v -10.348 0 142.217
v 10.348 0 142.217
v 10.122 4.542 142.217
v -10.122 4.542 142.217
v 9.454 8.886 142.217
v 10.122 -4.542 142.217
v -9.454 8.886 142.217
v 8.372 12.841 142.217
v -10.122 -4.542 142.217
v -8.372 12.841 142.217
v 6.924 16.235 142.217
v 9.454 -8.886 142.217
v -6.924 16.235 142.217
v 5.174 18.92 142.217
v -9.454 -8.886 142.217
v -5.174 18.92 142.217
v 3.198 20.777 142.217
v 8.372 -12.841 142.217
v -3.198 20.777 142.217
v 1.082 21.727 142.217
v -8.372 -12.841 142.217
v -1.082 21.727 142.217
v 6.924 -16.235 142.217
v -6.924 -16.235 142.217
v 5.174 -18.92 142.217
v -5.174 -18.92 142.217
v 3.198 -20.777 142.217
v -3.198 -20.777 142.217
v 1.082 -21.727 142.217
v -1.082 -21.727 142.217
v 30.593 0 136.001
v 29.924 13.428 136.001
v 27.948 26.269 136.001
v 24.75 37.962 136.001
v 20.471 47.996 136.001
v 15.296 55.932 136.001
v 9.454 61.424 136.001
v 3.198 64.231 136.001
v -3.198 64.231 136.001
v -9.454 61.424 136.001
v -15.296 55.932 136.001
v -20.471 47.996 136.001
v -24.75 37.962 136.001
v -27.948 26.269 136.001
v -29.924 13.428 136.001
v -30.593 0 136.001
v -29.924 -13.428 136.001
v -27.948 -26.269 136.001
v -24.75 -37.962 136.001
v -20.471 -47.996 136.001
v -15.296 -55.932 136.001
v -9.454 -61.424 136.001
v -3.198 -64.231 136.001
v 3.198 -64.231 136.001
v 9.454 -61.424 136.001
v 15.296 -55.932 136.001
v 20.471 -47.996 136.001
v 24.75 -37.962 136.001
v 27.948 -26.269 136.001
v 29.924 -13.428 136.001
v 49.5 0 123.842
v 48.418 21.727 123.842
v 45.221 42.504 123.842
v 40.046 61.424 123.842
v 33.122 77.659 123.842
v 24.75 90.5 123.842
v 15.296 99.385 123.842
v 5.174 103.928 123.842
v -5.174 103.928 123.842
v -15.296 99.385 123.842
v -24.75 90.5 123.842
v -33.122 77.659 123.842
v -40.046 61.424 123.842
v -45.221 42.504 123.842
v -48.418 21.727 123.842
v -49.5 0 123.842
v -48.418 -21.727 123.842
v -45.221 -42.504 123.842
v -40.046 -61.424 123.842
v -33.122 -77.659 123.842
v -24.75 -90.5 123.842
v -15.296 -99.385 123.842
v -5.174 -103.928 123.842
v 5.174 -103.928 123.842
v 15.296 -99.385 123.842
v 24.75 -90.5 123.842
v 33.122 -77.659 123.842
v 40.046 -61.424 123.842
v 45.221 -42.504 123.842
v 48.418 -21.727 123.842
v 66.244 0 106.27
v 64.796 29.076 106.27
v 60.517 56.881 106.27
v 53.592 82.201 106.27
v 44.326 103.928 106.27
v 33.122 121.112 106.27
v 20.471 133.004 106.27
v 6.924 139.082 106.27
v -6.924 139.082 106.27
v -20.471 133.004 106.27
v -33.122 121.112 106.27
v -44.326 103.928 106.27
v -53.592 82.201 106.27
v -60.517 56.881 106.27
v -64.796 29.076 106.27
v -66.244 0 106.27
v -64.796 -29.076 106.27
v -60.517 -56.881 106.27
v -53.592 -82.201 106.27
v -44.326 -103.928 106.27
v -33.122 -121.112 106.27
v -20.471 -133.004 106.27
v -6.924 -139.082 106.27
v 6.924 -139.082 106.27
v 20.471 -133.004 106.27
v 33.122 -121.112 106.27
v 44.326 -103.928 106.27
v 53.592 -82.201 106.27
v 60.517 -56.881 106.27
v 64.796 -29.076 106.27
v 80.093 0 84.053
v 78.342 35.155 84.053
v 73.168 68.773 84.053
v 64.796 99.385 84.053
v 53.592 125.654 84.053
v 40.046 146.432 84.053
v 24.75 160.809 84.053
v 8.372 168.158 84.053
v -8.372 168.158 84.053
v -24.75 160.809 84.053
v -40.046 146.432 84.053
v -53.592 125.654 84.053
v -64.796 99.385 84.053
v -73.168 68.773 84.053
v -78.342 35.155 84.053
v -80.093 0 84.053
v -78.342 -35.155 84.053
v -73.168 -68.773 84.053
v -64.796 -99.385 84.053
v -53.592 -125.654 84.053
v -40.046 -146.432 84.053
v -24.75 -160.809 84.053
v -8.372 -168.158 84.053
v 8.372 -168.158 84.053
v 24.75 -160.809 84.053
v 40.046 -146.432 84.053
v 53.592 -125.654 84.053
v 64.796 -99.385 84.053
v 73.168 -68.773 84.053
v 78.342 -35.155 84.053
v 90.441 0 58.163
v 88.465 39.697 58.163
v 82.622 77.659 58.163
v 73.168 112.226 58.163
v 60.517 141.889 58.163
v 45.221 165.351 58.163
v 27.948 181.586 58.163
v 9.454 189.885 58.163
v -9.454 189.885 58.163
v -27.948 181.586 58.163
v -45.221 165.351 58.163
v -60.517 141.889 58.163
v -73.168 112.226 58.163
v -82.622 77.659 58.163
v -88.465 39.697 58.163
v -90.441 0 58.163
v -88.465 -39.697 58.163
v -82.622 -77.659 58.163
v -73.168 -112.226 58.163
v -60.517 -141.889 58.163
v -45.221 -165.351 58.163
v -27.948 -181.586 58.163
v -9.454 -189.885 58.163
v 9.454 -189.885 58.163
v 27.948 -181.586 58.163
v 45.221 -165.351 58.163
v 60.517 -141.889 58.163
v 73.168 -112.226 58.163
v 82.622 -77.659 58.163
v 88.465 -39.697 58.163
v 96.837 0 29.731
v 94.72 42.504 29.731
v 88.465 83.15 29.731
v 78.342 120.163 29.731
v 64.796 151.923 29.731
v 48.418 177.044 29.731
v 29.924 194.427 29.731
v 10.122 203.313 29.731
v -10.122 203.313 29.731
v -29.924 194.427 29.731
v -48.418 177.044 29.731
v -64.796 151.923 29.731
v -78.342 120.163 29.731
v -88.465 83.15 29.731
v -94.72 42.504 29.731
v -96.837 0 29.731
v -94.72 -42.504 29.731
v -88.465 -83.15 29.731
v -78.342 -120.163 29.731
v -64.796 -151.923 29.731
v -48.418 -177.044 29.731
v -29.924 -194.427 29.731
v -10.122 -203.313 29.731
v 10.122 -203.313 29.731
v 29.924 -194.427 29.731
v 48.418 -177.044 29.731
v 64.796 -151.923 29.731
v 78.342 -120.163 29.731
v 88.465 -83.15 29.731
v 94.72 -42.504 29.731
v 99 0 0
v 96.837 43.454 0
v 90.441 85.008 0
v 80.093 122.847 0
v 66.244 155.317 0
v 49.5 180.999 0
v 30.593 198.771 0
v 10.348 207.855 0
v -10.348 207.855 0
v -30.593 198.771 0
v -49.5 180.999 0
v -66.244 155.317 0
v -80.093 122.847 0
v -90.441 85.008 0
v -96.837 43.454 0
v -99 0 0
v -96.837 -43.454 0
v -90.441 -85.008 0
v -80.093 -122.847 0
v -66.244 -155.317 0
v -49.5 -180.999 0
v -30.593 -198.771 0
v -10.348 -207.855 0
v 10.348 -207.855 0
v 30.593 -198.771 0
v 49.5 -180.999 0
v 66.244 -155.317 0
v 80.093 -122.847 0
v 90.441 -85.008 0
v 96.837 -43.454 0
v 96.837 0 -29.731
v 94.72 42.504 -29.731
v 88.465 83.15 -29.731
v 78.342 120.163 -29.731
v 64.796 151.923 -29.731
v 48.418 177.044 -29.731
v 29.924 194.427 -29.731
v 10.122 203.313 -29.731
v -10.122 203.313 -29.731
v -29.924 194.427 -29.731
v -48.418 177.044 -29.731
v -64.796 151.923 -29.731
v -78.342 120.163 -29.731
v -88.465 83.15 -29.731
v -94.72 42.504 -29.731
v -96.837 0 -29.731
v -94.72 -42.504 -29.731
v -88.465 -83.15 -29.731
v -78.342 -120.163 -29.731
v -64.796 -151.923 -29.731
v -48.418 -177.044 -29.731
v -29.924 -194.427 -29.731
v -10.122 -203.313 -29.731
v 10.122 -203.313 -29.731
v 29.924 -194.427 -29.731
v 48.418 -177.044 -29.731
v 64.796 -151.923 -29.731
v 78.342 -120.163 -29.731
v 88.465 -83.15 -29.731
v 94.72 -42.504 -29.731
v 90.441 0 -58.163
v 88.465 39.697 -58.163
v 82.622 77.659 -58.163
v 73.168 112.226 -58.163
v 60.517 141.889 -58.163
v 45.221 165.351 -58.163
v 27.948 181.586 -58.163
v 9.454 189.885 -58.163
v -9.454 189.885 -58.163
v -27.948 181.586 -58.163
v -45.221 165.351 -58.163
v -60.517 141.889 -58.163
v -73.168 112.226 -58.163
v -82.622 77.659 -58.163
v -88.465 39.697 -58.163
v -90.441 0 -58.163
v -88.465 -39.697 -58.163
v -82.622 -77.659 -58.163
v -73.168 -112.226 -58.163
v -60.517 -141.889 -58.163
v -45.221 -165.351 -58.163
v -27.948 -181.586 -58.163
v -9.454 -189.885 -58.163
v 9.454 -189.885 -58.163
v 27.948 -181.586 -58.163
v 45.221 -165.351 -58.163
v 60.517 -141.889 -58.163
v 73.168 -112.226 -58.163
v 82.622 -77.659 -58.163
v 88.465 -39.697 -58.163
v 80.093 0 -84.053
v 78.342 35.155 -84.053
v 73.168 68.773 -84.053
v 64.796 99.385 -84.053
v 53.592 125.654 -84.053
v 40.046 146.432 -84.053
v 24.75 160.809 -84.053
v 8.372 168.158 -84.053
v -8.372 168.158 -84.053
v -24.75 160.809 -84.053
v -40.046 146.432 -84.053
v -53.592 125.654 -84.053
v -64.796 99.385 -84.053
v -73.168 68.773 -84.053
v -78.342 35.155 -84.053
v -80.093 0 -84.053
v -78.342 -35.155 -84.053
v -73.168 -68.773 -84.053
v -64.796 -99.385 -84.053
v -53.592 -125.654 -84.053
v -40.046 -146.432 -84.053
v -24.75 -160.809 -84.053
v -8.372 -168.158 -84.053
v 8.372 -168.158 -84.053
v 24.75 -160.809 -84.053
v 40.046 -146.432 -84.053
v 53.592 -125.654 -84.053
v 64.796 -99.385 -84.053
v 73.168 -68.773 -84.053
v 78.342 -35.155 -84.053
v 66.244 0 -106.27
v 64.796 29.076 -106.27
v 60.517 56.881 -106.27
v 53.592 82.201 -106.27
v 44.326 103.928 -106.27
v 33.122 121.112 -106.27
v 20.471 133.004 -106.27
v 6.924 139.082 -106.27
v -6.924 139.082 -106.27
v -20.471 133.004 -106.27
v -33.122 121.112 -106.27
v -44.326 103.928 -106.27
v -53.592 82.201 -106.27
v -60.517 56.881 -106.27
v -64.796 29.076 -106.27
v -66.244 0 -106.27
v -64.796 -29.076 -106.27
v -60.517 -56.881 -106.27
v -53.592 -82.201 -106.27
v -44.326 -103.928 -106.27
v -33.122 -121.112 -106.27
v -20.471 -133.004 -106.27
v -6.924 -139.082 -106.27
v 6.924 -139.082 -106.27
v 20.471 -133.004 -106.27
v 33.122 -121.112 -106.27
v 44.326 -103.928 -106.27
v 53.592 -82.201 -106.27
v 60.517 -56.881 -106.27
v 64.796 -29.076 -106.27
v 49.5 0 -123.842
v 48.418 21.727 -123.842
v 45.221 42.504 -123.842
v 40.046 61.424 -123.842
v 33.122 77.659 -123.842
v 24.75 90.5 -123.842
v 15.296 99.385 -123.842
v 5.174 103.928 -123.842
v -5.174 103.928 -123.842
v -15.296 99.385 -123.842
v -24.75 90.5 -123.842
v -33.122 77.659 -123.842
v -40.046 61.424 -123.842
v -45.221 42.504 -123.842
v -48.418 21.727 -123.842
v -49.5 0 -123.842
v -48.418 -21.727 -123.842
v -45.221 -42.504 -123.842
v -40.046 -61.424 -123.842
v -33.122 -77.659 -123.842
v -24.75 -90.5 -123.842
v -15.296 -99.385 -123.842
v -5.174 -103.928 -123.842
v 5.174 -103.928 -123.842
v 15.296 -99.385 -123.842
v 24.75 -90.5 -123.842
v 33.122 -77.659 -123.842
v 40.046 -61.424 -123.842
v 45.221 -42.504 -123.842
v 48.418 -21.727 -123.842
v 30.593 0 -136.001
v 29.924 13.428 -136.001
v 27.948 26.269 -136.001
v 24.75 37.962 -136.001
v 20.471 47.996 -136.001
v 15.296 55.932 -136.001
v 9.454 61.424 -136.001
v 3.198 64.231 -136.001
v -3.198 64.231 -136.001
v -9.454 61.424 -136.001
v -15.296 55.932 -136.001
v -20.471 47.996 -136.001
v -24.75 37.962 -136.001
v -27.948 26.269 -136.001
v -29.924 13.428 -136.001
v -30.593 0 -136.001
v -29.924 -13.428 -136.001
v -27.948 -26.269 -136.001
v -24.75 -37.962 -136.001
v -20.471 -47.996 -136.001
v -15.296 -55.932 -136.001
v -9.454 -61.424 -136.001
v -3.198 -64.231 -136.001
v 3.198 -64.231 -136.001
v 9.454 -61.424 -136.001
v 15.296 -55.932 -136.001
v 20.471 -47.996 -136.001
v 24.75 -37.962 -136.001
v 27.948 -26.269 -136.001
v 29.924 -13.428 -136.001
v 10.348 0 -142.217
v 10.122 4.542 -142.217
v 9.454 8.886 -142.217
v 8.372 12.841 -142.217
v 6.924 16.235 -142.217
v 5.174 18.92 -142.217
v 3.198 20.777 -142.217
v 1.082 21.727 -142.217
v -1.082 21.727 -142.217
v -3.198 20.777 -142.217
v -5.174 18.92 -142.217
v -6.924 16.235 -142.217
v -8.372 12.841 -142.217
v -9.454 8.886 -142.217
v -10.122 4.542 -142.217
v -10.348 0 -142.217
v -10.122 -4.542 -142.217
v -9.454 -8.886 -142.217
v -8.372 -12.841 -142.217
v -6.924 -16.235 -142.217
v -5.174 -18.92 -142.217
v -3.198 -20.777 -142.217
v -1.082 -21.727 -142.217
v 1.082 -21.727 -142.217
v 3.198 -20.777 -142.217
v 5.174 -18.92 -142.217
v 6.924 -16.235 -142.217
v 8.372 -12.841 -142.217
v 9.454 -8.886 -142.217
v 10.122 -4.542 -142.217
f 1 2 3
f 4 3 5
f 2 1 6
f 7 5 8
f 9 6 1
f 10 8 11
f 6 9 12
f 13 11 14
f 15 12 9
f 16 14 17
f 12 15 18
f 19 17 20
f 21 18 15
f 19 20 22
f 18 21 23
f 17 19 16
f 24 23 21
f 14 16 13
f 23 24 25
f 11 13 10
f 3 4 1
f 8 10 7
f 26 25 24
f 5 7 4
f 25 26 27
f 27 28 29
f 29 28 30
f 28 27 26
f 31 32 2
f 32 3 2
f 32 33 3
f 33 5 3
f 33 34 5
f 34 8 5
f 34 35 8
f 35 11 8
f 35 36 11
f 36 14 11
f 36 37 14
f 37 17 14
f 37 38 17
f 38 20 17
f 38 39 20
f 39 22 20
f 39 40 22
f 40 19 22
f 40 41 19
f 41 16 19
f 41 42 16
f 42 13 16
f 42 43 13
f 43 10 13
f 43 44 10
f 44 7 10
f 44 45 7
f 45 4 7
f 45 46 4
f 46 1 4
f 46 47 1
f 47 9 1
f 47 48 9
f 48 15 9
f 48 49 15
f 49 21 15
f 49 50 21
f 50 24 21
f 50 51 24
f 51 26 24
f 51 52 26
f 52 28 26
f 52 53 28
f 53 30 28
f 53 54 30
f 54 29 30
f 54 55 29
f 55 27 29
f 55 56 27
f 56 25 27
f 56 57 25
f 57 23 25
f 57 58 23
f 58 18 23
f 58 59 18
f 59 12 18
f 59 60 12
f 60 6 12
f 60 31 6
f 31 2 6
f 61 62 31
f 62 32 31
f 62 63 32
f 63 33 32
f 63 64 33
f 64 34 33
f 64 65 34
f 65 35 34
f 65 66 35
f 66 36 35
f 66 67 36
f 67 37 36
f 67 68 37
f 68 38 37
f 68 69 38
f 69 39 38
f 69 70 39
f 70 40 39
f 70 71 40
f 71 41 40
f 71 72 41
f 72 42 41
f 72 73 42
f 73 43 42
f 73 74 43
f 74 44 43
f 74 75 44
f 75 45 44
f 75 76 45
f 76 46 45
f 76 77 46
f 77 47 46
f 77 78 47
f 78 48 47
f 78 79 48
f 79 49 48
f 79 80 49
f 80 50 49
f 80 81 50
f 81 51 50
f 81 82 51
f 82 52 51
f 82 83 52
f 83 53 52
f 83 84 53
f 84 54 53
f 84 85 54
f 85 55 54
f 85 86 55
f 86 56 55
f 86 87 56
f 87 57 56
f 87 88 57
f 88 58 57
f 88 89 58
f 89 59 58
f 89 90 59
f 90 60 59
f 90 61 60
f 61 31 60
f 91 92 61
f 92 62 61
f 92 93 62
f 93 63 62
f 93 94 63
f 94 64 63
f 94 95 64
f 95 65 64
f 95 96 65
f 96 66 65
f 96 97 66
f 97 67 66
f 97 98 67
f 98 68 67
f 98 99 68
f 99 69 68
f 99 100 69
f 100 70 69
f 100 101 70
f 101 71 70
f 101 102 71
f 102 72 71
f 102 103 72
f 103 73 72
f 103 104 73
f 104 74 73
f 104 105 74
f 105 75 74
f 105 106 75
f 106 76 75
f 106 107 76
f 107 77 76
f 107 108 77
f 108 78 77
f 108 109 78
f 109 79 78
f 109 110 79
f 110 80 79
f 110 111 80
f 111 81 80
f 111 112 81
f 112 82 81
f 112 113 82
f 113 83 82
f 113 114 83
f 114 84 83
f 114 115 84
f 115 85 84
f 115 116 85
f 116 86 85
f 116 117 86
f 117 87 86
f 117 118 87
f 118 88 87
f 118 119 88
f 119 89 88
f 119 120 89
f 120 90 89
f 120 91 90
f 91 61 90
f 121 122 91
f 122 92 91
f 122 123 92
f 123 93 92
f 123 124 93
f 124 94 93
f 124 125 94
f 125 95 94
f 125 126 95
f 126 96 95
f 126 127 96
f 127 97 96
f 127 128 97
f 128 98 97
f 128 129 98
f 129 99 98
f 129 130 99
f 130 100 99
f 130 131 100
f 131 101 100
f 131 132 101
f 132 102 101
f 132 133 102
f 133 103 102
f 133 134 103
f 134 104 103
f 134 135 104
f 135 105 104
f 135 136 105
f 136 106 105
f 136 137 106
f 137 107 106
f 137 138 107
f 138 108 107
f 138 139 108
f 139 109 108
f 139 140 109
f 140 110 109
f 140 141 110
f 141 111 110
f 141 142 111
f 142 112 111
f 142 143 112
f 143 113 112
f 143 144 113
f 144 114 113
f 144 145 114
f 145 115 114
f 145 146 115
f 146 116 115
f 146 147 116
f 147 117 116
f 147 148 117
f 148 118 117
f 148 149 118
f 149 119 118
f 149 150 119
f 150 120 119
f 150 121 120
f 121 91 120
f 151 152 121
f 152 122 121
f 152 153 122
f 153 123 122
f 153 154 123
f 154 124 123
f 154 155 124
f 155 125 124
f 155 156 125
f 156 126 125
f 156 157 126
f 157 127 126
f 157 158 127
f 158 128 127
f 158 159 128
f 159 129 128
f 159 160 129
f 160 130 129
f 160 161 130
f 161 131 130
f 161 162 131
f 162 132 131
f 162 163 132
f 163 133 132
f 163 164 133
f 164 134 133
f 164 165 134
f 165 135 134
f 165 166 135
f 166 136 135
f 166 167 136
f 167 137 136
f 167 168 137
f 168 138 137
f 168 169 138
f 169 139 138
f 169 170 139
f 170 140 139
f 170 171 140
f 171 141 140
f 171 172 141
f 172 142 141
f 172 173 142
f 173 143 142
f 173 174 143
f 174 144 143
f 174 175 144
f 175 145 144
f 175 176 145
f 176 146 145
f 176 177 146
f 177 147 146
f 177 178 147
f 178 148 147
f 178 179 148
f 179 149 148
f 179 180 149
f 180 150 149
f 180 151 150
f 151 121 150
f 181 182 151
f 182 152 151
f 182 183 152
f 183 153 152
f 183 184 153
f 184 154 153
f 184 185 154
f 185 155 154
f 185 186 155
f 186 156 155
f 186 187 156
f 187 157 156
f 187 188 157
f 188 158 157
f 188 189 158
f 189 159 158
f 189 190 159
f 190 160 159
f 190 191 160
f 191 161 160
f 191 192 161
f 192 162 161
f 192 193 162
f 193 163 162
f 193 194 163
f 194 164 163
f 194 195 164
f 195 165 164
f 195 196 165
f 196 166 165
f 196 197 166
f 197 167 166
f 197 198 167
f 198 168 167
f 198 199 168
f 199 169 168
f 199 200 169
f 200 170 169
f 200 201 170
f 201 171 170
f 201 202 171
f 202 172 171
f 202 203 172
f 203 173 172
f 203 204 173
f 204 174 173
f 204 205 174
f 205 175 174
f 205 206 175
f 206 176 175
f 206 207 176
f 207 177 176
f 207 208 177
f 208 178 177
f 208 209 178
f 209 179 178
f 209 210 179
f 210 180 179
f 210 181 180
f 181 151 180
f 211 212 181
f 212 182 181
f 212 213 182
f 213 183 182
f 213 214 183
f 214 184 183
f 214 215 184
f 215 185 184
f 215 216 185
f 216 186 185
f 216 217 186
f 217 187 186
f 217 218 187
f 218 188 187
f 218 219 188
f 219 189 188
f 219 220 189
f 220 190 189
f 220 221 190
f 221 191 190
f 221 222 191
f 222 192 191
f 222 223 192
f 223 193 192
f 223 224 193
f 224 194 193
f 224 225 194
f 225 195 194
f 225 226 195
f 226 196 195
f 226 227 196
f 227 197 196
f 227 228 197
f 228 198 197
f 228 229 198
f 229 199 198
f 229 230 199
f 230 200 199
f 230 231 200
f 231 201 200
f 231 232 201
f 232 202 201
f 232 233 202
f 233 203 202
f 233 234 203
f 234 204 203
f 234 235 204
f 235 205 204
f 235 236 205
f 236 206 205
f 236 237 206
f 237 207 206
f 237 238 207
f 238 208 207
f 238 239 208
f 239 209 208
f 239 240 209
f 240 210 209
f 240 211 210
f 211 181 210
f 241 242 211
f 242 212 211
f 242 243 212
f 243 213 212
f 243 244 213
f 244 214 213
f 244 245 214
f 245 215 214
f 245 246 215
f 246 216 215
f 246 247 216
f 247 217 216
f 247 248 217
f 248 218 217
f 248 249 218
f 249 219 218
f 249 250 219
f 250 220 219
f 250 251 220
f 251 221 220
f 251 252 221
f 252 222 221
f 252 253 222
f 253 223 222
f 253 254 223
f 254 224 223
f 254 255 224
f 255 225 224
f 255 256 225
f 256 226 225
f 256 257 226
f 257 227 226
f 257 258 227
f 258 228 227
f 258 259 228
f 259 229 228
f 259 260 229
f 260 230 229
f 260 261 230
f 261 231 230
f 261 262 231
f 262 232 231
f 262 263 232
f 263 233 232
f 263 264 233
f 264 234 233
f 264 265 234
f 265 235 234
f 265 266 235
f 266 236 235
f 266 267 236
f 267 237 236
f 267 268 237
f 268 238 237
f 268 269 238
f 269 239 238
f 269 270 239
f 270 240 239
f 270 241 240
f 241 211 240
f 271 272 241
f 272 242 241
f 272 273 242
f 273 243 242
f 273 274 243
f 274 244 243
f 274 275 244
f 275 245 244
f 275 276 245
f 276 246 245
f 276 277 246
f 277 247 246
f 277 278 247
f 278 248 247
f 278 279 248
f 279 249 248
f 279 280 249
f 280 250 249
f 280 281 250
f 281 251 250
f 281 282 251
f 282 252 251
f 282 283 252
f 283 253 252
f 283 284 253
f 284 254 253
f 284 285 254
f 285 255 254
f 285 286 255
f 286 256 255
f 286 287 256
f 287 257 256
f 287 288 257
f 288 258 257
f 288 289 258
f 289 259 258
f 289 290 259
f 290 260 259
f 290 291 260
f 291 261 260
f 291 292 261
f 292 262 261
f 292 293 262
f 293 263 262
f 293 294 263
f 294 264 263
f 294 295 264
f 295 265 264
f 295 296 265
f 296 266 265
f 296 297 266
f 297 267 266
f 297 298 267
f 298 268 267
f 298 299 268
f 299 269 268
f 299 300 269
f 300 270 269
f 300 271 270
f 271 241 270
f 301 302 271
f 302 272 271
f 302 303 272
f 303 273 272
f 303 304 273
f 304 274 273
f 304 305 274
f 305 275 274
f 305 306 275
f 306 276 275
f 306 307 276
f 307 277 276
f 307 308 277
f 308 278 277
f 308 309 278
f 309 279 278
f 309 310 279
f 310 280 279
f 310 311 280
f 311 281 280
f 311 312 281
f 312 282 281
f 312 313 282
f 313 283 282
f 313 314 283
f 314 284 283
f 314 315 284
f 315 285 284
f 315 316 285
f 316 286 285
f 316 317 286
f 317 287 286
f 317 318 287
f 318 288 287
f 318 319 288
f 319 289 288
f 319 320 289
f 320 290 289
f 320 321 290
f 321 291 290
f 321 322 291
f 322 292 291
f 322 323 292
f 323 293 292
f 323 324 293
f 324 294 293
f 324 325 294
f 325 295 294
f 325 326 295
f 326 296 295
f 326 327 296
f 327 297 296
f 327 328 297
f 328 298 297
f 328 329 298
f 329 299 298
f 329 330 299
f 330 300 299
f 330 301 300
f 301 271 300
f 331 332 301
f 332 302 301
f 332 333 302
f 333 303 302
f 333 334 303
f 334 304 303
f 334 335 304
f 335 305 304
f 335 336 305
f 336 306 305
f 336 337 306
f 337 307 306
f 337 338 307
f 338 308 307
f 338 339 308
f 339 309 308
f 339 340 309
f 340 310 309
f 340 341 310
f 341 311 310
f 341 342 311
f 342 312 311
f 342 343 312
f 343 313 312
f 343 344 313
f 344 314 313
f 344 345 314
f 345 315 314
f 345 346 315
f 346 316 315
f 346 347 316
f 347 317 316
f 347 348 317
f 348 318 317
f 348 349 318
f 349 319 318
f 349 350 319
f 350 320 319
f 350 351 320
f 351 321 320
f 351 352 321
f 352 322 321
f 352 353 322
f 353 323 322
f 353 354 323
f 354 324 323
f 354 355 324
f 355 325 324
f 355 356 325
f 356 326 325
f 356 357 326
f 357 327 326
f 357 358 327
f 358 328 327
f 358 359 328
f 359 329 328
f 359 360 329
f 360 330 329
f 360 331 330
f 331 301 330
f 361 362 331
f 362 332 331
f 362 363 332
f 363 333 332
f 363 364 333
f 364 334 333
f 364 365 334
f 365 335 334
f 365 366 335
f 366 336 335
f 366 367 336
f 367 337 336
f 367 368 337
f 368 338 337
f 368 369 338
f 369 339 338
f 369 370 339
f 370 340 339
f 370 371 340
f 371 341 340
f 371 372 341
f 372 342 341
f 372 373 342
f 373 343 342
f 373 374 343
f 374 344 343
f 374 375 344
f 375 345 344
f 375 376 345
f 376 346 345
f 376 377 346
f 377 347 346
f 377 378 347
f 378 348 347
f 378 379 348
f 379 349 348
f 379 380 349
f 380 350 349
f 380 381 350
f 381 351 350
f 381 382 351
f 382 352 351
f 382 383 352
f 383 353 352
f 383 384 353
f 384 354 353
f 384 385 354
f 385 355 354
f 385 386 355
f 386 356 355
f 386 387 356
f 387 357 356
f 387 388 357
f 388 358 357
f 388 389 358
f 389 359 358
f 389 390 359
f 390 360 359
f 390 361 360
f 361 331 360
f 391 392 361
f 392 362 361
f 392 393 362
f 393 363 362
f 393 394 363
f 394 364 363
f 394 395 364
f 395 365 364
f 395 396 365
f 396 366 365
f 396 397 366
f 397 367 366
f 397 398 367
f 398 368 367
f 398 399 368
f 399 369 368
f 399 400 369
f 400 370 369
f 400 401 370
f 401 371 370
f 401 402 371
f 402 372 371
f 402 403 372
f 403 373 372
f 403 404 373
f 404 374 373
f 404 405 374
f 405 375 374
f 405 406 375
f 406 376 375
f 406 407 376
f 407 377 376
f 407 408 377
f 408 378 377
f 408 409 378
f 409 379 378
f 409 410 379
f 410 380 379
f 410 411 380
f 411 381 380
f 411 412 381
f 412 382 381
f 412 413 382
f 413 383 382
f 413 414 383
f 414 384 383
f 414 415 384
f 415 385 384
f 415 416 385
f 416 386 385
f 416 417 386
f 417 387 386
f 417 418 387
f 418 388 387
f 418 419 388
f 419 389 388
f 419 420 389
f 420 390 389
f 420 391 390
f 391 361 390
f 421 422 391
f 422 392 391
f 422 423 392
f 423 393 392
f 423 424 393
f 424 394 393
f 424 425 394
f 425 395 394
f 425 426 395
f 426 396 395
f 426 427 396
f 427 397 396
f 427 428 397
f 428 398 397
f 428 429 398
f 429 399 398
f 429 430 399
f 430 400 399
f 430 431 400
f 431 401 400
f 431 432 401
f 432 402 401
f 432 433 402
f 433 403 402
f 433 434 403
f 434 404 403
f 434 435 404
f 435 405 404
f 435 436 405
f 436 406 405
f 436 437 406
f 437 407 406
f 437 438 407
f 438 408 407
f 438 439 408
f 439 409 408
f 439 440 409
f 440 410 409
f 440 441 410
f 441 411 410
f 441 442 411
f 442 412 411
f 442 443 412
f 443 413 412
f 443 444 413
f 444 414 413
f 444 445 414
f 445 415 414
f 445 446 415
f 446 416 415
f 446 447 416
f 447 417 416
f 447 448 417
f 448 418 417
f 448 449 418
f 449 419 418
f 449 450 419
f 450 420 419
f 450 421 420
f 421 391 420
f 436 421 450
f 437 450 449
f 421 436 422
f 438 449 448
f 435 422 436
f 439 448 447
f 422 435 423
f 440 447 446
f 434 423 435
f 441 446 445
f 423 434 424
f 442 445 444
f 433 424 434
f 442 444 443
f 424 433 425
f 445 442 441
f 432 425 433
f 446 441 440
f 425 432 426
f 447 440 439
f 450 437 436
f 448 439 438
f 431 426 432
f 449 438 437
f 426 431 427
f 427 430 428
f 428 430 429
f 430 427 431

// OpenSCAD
// Generated by SolidPython 1.0.1 on 2020-07-29 00:46:49


scale(v = [9, 19, 13]) {
	sphere(r = 11);
}
/***********************************************
*********      SolidPython code:      **********
************************************************
 
# import packages: SolidPython
from solid import *
from solid.utils import *
from itertools import chain, combinations, permutations


class Resize:

    def __init__(self, scad_file):
        self.scad_file = scad_file
        #self.scad_file = import_scad(scad_file)
        # cone/cylinder param:
        self.r1 = 0
        self.r2 = 0
        self.h = 0
        # rectangular prism param:
        self.w = 0
        self.l = 0
        # ellipse param:
        self.r = 0

    # import OpenScad code (file name corresponds to shape)


    # classify shape + parameters
    def assign(self, param1, param2, param3):
        if self.scad_file == 'cone.scad':
            self.r1 = param1
            self.r2 = param2
            self.h = param3
        elif self.scad_file == 'cylinder.scad':
            self.r1 = param1
            self.r2 = param2
            self.h = param3
        elif self.scad_file == 'rectangularPrism.scad':
            self.h = param1
            self.l = param2
            self.w = param3
        else:
            self.r = param1
            self.h = param2

    # resize parameters
    def iterate(self):
        x = range(3, 20, 2)
        i = 1
        if self.scad_file == 'cone.scad':
            tempList = list(permutations(x, 2))
            for temp in tempList:
                param1 = temp[0]
                param2 = temp[1]
                filepath = 'produced_scad_files/' + 'cone' + str(param1) + '_' + str(param2) + '_' + '.scad'
                scad_render_to_file(cylinder(h=param1, r1=param2, r2=0), filepath)

        elif self.scad_file == 'cylinder.scad':
            tempList = list(permutations(x, 3))
            for temp in tempList:
                param1 = temp[0]
                param2 = temp[1]
                filepath = 'produced_scad_files/' + 'cylinder' + str(param1) + '_' + str(param2) + '_' + '.scad'
                scad_render_to_file(cylinder(h=param1, r1=param2, r2=param2), filepath)

        elif self.scad_file == 'rectangularPrism.scad':
            tempList = list(permutations(x, 3))
            for temp in tempList:
                param1 = temp[0]
                param2 = temp[1]
                param3 = temp[2]
                filepath = 'produced_scad_files/' + 'rectangularPrism' + str(param1) + '_' + str(param2) + '_' + str(
                    param3) + '.scad'
                scad_render_to_file(cube(size=(param1, param2, param3)), filepath)

        elif self.scad_file == 'ellipse.scad':
            tempList = list(permutations(x, 4))
            for temp in tempList:
                param1 = temp[0]
                param2 = temp[1]
                param3 = temp[2]
                param4 = temp[3]
                filepath = 'produced_scad_files/' + 'ellipse' + str(param1) + '_' + str(param2) + '_' + str(param3) + '_' + str(param4) + '.scad'
                scad_render_to_file(scale([param1, param2, param3])(sphere(r=param4)), filepath)

    def render_to_scadfile(self):
        scad_render_to_file(scad, 'example.scad') 
 
************************************************/
